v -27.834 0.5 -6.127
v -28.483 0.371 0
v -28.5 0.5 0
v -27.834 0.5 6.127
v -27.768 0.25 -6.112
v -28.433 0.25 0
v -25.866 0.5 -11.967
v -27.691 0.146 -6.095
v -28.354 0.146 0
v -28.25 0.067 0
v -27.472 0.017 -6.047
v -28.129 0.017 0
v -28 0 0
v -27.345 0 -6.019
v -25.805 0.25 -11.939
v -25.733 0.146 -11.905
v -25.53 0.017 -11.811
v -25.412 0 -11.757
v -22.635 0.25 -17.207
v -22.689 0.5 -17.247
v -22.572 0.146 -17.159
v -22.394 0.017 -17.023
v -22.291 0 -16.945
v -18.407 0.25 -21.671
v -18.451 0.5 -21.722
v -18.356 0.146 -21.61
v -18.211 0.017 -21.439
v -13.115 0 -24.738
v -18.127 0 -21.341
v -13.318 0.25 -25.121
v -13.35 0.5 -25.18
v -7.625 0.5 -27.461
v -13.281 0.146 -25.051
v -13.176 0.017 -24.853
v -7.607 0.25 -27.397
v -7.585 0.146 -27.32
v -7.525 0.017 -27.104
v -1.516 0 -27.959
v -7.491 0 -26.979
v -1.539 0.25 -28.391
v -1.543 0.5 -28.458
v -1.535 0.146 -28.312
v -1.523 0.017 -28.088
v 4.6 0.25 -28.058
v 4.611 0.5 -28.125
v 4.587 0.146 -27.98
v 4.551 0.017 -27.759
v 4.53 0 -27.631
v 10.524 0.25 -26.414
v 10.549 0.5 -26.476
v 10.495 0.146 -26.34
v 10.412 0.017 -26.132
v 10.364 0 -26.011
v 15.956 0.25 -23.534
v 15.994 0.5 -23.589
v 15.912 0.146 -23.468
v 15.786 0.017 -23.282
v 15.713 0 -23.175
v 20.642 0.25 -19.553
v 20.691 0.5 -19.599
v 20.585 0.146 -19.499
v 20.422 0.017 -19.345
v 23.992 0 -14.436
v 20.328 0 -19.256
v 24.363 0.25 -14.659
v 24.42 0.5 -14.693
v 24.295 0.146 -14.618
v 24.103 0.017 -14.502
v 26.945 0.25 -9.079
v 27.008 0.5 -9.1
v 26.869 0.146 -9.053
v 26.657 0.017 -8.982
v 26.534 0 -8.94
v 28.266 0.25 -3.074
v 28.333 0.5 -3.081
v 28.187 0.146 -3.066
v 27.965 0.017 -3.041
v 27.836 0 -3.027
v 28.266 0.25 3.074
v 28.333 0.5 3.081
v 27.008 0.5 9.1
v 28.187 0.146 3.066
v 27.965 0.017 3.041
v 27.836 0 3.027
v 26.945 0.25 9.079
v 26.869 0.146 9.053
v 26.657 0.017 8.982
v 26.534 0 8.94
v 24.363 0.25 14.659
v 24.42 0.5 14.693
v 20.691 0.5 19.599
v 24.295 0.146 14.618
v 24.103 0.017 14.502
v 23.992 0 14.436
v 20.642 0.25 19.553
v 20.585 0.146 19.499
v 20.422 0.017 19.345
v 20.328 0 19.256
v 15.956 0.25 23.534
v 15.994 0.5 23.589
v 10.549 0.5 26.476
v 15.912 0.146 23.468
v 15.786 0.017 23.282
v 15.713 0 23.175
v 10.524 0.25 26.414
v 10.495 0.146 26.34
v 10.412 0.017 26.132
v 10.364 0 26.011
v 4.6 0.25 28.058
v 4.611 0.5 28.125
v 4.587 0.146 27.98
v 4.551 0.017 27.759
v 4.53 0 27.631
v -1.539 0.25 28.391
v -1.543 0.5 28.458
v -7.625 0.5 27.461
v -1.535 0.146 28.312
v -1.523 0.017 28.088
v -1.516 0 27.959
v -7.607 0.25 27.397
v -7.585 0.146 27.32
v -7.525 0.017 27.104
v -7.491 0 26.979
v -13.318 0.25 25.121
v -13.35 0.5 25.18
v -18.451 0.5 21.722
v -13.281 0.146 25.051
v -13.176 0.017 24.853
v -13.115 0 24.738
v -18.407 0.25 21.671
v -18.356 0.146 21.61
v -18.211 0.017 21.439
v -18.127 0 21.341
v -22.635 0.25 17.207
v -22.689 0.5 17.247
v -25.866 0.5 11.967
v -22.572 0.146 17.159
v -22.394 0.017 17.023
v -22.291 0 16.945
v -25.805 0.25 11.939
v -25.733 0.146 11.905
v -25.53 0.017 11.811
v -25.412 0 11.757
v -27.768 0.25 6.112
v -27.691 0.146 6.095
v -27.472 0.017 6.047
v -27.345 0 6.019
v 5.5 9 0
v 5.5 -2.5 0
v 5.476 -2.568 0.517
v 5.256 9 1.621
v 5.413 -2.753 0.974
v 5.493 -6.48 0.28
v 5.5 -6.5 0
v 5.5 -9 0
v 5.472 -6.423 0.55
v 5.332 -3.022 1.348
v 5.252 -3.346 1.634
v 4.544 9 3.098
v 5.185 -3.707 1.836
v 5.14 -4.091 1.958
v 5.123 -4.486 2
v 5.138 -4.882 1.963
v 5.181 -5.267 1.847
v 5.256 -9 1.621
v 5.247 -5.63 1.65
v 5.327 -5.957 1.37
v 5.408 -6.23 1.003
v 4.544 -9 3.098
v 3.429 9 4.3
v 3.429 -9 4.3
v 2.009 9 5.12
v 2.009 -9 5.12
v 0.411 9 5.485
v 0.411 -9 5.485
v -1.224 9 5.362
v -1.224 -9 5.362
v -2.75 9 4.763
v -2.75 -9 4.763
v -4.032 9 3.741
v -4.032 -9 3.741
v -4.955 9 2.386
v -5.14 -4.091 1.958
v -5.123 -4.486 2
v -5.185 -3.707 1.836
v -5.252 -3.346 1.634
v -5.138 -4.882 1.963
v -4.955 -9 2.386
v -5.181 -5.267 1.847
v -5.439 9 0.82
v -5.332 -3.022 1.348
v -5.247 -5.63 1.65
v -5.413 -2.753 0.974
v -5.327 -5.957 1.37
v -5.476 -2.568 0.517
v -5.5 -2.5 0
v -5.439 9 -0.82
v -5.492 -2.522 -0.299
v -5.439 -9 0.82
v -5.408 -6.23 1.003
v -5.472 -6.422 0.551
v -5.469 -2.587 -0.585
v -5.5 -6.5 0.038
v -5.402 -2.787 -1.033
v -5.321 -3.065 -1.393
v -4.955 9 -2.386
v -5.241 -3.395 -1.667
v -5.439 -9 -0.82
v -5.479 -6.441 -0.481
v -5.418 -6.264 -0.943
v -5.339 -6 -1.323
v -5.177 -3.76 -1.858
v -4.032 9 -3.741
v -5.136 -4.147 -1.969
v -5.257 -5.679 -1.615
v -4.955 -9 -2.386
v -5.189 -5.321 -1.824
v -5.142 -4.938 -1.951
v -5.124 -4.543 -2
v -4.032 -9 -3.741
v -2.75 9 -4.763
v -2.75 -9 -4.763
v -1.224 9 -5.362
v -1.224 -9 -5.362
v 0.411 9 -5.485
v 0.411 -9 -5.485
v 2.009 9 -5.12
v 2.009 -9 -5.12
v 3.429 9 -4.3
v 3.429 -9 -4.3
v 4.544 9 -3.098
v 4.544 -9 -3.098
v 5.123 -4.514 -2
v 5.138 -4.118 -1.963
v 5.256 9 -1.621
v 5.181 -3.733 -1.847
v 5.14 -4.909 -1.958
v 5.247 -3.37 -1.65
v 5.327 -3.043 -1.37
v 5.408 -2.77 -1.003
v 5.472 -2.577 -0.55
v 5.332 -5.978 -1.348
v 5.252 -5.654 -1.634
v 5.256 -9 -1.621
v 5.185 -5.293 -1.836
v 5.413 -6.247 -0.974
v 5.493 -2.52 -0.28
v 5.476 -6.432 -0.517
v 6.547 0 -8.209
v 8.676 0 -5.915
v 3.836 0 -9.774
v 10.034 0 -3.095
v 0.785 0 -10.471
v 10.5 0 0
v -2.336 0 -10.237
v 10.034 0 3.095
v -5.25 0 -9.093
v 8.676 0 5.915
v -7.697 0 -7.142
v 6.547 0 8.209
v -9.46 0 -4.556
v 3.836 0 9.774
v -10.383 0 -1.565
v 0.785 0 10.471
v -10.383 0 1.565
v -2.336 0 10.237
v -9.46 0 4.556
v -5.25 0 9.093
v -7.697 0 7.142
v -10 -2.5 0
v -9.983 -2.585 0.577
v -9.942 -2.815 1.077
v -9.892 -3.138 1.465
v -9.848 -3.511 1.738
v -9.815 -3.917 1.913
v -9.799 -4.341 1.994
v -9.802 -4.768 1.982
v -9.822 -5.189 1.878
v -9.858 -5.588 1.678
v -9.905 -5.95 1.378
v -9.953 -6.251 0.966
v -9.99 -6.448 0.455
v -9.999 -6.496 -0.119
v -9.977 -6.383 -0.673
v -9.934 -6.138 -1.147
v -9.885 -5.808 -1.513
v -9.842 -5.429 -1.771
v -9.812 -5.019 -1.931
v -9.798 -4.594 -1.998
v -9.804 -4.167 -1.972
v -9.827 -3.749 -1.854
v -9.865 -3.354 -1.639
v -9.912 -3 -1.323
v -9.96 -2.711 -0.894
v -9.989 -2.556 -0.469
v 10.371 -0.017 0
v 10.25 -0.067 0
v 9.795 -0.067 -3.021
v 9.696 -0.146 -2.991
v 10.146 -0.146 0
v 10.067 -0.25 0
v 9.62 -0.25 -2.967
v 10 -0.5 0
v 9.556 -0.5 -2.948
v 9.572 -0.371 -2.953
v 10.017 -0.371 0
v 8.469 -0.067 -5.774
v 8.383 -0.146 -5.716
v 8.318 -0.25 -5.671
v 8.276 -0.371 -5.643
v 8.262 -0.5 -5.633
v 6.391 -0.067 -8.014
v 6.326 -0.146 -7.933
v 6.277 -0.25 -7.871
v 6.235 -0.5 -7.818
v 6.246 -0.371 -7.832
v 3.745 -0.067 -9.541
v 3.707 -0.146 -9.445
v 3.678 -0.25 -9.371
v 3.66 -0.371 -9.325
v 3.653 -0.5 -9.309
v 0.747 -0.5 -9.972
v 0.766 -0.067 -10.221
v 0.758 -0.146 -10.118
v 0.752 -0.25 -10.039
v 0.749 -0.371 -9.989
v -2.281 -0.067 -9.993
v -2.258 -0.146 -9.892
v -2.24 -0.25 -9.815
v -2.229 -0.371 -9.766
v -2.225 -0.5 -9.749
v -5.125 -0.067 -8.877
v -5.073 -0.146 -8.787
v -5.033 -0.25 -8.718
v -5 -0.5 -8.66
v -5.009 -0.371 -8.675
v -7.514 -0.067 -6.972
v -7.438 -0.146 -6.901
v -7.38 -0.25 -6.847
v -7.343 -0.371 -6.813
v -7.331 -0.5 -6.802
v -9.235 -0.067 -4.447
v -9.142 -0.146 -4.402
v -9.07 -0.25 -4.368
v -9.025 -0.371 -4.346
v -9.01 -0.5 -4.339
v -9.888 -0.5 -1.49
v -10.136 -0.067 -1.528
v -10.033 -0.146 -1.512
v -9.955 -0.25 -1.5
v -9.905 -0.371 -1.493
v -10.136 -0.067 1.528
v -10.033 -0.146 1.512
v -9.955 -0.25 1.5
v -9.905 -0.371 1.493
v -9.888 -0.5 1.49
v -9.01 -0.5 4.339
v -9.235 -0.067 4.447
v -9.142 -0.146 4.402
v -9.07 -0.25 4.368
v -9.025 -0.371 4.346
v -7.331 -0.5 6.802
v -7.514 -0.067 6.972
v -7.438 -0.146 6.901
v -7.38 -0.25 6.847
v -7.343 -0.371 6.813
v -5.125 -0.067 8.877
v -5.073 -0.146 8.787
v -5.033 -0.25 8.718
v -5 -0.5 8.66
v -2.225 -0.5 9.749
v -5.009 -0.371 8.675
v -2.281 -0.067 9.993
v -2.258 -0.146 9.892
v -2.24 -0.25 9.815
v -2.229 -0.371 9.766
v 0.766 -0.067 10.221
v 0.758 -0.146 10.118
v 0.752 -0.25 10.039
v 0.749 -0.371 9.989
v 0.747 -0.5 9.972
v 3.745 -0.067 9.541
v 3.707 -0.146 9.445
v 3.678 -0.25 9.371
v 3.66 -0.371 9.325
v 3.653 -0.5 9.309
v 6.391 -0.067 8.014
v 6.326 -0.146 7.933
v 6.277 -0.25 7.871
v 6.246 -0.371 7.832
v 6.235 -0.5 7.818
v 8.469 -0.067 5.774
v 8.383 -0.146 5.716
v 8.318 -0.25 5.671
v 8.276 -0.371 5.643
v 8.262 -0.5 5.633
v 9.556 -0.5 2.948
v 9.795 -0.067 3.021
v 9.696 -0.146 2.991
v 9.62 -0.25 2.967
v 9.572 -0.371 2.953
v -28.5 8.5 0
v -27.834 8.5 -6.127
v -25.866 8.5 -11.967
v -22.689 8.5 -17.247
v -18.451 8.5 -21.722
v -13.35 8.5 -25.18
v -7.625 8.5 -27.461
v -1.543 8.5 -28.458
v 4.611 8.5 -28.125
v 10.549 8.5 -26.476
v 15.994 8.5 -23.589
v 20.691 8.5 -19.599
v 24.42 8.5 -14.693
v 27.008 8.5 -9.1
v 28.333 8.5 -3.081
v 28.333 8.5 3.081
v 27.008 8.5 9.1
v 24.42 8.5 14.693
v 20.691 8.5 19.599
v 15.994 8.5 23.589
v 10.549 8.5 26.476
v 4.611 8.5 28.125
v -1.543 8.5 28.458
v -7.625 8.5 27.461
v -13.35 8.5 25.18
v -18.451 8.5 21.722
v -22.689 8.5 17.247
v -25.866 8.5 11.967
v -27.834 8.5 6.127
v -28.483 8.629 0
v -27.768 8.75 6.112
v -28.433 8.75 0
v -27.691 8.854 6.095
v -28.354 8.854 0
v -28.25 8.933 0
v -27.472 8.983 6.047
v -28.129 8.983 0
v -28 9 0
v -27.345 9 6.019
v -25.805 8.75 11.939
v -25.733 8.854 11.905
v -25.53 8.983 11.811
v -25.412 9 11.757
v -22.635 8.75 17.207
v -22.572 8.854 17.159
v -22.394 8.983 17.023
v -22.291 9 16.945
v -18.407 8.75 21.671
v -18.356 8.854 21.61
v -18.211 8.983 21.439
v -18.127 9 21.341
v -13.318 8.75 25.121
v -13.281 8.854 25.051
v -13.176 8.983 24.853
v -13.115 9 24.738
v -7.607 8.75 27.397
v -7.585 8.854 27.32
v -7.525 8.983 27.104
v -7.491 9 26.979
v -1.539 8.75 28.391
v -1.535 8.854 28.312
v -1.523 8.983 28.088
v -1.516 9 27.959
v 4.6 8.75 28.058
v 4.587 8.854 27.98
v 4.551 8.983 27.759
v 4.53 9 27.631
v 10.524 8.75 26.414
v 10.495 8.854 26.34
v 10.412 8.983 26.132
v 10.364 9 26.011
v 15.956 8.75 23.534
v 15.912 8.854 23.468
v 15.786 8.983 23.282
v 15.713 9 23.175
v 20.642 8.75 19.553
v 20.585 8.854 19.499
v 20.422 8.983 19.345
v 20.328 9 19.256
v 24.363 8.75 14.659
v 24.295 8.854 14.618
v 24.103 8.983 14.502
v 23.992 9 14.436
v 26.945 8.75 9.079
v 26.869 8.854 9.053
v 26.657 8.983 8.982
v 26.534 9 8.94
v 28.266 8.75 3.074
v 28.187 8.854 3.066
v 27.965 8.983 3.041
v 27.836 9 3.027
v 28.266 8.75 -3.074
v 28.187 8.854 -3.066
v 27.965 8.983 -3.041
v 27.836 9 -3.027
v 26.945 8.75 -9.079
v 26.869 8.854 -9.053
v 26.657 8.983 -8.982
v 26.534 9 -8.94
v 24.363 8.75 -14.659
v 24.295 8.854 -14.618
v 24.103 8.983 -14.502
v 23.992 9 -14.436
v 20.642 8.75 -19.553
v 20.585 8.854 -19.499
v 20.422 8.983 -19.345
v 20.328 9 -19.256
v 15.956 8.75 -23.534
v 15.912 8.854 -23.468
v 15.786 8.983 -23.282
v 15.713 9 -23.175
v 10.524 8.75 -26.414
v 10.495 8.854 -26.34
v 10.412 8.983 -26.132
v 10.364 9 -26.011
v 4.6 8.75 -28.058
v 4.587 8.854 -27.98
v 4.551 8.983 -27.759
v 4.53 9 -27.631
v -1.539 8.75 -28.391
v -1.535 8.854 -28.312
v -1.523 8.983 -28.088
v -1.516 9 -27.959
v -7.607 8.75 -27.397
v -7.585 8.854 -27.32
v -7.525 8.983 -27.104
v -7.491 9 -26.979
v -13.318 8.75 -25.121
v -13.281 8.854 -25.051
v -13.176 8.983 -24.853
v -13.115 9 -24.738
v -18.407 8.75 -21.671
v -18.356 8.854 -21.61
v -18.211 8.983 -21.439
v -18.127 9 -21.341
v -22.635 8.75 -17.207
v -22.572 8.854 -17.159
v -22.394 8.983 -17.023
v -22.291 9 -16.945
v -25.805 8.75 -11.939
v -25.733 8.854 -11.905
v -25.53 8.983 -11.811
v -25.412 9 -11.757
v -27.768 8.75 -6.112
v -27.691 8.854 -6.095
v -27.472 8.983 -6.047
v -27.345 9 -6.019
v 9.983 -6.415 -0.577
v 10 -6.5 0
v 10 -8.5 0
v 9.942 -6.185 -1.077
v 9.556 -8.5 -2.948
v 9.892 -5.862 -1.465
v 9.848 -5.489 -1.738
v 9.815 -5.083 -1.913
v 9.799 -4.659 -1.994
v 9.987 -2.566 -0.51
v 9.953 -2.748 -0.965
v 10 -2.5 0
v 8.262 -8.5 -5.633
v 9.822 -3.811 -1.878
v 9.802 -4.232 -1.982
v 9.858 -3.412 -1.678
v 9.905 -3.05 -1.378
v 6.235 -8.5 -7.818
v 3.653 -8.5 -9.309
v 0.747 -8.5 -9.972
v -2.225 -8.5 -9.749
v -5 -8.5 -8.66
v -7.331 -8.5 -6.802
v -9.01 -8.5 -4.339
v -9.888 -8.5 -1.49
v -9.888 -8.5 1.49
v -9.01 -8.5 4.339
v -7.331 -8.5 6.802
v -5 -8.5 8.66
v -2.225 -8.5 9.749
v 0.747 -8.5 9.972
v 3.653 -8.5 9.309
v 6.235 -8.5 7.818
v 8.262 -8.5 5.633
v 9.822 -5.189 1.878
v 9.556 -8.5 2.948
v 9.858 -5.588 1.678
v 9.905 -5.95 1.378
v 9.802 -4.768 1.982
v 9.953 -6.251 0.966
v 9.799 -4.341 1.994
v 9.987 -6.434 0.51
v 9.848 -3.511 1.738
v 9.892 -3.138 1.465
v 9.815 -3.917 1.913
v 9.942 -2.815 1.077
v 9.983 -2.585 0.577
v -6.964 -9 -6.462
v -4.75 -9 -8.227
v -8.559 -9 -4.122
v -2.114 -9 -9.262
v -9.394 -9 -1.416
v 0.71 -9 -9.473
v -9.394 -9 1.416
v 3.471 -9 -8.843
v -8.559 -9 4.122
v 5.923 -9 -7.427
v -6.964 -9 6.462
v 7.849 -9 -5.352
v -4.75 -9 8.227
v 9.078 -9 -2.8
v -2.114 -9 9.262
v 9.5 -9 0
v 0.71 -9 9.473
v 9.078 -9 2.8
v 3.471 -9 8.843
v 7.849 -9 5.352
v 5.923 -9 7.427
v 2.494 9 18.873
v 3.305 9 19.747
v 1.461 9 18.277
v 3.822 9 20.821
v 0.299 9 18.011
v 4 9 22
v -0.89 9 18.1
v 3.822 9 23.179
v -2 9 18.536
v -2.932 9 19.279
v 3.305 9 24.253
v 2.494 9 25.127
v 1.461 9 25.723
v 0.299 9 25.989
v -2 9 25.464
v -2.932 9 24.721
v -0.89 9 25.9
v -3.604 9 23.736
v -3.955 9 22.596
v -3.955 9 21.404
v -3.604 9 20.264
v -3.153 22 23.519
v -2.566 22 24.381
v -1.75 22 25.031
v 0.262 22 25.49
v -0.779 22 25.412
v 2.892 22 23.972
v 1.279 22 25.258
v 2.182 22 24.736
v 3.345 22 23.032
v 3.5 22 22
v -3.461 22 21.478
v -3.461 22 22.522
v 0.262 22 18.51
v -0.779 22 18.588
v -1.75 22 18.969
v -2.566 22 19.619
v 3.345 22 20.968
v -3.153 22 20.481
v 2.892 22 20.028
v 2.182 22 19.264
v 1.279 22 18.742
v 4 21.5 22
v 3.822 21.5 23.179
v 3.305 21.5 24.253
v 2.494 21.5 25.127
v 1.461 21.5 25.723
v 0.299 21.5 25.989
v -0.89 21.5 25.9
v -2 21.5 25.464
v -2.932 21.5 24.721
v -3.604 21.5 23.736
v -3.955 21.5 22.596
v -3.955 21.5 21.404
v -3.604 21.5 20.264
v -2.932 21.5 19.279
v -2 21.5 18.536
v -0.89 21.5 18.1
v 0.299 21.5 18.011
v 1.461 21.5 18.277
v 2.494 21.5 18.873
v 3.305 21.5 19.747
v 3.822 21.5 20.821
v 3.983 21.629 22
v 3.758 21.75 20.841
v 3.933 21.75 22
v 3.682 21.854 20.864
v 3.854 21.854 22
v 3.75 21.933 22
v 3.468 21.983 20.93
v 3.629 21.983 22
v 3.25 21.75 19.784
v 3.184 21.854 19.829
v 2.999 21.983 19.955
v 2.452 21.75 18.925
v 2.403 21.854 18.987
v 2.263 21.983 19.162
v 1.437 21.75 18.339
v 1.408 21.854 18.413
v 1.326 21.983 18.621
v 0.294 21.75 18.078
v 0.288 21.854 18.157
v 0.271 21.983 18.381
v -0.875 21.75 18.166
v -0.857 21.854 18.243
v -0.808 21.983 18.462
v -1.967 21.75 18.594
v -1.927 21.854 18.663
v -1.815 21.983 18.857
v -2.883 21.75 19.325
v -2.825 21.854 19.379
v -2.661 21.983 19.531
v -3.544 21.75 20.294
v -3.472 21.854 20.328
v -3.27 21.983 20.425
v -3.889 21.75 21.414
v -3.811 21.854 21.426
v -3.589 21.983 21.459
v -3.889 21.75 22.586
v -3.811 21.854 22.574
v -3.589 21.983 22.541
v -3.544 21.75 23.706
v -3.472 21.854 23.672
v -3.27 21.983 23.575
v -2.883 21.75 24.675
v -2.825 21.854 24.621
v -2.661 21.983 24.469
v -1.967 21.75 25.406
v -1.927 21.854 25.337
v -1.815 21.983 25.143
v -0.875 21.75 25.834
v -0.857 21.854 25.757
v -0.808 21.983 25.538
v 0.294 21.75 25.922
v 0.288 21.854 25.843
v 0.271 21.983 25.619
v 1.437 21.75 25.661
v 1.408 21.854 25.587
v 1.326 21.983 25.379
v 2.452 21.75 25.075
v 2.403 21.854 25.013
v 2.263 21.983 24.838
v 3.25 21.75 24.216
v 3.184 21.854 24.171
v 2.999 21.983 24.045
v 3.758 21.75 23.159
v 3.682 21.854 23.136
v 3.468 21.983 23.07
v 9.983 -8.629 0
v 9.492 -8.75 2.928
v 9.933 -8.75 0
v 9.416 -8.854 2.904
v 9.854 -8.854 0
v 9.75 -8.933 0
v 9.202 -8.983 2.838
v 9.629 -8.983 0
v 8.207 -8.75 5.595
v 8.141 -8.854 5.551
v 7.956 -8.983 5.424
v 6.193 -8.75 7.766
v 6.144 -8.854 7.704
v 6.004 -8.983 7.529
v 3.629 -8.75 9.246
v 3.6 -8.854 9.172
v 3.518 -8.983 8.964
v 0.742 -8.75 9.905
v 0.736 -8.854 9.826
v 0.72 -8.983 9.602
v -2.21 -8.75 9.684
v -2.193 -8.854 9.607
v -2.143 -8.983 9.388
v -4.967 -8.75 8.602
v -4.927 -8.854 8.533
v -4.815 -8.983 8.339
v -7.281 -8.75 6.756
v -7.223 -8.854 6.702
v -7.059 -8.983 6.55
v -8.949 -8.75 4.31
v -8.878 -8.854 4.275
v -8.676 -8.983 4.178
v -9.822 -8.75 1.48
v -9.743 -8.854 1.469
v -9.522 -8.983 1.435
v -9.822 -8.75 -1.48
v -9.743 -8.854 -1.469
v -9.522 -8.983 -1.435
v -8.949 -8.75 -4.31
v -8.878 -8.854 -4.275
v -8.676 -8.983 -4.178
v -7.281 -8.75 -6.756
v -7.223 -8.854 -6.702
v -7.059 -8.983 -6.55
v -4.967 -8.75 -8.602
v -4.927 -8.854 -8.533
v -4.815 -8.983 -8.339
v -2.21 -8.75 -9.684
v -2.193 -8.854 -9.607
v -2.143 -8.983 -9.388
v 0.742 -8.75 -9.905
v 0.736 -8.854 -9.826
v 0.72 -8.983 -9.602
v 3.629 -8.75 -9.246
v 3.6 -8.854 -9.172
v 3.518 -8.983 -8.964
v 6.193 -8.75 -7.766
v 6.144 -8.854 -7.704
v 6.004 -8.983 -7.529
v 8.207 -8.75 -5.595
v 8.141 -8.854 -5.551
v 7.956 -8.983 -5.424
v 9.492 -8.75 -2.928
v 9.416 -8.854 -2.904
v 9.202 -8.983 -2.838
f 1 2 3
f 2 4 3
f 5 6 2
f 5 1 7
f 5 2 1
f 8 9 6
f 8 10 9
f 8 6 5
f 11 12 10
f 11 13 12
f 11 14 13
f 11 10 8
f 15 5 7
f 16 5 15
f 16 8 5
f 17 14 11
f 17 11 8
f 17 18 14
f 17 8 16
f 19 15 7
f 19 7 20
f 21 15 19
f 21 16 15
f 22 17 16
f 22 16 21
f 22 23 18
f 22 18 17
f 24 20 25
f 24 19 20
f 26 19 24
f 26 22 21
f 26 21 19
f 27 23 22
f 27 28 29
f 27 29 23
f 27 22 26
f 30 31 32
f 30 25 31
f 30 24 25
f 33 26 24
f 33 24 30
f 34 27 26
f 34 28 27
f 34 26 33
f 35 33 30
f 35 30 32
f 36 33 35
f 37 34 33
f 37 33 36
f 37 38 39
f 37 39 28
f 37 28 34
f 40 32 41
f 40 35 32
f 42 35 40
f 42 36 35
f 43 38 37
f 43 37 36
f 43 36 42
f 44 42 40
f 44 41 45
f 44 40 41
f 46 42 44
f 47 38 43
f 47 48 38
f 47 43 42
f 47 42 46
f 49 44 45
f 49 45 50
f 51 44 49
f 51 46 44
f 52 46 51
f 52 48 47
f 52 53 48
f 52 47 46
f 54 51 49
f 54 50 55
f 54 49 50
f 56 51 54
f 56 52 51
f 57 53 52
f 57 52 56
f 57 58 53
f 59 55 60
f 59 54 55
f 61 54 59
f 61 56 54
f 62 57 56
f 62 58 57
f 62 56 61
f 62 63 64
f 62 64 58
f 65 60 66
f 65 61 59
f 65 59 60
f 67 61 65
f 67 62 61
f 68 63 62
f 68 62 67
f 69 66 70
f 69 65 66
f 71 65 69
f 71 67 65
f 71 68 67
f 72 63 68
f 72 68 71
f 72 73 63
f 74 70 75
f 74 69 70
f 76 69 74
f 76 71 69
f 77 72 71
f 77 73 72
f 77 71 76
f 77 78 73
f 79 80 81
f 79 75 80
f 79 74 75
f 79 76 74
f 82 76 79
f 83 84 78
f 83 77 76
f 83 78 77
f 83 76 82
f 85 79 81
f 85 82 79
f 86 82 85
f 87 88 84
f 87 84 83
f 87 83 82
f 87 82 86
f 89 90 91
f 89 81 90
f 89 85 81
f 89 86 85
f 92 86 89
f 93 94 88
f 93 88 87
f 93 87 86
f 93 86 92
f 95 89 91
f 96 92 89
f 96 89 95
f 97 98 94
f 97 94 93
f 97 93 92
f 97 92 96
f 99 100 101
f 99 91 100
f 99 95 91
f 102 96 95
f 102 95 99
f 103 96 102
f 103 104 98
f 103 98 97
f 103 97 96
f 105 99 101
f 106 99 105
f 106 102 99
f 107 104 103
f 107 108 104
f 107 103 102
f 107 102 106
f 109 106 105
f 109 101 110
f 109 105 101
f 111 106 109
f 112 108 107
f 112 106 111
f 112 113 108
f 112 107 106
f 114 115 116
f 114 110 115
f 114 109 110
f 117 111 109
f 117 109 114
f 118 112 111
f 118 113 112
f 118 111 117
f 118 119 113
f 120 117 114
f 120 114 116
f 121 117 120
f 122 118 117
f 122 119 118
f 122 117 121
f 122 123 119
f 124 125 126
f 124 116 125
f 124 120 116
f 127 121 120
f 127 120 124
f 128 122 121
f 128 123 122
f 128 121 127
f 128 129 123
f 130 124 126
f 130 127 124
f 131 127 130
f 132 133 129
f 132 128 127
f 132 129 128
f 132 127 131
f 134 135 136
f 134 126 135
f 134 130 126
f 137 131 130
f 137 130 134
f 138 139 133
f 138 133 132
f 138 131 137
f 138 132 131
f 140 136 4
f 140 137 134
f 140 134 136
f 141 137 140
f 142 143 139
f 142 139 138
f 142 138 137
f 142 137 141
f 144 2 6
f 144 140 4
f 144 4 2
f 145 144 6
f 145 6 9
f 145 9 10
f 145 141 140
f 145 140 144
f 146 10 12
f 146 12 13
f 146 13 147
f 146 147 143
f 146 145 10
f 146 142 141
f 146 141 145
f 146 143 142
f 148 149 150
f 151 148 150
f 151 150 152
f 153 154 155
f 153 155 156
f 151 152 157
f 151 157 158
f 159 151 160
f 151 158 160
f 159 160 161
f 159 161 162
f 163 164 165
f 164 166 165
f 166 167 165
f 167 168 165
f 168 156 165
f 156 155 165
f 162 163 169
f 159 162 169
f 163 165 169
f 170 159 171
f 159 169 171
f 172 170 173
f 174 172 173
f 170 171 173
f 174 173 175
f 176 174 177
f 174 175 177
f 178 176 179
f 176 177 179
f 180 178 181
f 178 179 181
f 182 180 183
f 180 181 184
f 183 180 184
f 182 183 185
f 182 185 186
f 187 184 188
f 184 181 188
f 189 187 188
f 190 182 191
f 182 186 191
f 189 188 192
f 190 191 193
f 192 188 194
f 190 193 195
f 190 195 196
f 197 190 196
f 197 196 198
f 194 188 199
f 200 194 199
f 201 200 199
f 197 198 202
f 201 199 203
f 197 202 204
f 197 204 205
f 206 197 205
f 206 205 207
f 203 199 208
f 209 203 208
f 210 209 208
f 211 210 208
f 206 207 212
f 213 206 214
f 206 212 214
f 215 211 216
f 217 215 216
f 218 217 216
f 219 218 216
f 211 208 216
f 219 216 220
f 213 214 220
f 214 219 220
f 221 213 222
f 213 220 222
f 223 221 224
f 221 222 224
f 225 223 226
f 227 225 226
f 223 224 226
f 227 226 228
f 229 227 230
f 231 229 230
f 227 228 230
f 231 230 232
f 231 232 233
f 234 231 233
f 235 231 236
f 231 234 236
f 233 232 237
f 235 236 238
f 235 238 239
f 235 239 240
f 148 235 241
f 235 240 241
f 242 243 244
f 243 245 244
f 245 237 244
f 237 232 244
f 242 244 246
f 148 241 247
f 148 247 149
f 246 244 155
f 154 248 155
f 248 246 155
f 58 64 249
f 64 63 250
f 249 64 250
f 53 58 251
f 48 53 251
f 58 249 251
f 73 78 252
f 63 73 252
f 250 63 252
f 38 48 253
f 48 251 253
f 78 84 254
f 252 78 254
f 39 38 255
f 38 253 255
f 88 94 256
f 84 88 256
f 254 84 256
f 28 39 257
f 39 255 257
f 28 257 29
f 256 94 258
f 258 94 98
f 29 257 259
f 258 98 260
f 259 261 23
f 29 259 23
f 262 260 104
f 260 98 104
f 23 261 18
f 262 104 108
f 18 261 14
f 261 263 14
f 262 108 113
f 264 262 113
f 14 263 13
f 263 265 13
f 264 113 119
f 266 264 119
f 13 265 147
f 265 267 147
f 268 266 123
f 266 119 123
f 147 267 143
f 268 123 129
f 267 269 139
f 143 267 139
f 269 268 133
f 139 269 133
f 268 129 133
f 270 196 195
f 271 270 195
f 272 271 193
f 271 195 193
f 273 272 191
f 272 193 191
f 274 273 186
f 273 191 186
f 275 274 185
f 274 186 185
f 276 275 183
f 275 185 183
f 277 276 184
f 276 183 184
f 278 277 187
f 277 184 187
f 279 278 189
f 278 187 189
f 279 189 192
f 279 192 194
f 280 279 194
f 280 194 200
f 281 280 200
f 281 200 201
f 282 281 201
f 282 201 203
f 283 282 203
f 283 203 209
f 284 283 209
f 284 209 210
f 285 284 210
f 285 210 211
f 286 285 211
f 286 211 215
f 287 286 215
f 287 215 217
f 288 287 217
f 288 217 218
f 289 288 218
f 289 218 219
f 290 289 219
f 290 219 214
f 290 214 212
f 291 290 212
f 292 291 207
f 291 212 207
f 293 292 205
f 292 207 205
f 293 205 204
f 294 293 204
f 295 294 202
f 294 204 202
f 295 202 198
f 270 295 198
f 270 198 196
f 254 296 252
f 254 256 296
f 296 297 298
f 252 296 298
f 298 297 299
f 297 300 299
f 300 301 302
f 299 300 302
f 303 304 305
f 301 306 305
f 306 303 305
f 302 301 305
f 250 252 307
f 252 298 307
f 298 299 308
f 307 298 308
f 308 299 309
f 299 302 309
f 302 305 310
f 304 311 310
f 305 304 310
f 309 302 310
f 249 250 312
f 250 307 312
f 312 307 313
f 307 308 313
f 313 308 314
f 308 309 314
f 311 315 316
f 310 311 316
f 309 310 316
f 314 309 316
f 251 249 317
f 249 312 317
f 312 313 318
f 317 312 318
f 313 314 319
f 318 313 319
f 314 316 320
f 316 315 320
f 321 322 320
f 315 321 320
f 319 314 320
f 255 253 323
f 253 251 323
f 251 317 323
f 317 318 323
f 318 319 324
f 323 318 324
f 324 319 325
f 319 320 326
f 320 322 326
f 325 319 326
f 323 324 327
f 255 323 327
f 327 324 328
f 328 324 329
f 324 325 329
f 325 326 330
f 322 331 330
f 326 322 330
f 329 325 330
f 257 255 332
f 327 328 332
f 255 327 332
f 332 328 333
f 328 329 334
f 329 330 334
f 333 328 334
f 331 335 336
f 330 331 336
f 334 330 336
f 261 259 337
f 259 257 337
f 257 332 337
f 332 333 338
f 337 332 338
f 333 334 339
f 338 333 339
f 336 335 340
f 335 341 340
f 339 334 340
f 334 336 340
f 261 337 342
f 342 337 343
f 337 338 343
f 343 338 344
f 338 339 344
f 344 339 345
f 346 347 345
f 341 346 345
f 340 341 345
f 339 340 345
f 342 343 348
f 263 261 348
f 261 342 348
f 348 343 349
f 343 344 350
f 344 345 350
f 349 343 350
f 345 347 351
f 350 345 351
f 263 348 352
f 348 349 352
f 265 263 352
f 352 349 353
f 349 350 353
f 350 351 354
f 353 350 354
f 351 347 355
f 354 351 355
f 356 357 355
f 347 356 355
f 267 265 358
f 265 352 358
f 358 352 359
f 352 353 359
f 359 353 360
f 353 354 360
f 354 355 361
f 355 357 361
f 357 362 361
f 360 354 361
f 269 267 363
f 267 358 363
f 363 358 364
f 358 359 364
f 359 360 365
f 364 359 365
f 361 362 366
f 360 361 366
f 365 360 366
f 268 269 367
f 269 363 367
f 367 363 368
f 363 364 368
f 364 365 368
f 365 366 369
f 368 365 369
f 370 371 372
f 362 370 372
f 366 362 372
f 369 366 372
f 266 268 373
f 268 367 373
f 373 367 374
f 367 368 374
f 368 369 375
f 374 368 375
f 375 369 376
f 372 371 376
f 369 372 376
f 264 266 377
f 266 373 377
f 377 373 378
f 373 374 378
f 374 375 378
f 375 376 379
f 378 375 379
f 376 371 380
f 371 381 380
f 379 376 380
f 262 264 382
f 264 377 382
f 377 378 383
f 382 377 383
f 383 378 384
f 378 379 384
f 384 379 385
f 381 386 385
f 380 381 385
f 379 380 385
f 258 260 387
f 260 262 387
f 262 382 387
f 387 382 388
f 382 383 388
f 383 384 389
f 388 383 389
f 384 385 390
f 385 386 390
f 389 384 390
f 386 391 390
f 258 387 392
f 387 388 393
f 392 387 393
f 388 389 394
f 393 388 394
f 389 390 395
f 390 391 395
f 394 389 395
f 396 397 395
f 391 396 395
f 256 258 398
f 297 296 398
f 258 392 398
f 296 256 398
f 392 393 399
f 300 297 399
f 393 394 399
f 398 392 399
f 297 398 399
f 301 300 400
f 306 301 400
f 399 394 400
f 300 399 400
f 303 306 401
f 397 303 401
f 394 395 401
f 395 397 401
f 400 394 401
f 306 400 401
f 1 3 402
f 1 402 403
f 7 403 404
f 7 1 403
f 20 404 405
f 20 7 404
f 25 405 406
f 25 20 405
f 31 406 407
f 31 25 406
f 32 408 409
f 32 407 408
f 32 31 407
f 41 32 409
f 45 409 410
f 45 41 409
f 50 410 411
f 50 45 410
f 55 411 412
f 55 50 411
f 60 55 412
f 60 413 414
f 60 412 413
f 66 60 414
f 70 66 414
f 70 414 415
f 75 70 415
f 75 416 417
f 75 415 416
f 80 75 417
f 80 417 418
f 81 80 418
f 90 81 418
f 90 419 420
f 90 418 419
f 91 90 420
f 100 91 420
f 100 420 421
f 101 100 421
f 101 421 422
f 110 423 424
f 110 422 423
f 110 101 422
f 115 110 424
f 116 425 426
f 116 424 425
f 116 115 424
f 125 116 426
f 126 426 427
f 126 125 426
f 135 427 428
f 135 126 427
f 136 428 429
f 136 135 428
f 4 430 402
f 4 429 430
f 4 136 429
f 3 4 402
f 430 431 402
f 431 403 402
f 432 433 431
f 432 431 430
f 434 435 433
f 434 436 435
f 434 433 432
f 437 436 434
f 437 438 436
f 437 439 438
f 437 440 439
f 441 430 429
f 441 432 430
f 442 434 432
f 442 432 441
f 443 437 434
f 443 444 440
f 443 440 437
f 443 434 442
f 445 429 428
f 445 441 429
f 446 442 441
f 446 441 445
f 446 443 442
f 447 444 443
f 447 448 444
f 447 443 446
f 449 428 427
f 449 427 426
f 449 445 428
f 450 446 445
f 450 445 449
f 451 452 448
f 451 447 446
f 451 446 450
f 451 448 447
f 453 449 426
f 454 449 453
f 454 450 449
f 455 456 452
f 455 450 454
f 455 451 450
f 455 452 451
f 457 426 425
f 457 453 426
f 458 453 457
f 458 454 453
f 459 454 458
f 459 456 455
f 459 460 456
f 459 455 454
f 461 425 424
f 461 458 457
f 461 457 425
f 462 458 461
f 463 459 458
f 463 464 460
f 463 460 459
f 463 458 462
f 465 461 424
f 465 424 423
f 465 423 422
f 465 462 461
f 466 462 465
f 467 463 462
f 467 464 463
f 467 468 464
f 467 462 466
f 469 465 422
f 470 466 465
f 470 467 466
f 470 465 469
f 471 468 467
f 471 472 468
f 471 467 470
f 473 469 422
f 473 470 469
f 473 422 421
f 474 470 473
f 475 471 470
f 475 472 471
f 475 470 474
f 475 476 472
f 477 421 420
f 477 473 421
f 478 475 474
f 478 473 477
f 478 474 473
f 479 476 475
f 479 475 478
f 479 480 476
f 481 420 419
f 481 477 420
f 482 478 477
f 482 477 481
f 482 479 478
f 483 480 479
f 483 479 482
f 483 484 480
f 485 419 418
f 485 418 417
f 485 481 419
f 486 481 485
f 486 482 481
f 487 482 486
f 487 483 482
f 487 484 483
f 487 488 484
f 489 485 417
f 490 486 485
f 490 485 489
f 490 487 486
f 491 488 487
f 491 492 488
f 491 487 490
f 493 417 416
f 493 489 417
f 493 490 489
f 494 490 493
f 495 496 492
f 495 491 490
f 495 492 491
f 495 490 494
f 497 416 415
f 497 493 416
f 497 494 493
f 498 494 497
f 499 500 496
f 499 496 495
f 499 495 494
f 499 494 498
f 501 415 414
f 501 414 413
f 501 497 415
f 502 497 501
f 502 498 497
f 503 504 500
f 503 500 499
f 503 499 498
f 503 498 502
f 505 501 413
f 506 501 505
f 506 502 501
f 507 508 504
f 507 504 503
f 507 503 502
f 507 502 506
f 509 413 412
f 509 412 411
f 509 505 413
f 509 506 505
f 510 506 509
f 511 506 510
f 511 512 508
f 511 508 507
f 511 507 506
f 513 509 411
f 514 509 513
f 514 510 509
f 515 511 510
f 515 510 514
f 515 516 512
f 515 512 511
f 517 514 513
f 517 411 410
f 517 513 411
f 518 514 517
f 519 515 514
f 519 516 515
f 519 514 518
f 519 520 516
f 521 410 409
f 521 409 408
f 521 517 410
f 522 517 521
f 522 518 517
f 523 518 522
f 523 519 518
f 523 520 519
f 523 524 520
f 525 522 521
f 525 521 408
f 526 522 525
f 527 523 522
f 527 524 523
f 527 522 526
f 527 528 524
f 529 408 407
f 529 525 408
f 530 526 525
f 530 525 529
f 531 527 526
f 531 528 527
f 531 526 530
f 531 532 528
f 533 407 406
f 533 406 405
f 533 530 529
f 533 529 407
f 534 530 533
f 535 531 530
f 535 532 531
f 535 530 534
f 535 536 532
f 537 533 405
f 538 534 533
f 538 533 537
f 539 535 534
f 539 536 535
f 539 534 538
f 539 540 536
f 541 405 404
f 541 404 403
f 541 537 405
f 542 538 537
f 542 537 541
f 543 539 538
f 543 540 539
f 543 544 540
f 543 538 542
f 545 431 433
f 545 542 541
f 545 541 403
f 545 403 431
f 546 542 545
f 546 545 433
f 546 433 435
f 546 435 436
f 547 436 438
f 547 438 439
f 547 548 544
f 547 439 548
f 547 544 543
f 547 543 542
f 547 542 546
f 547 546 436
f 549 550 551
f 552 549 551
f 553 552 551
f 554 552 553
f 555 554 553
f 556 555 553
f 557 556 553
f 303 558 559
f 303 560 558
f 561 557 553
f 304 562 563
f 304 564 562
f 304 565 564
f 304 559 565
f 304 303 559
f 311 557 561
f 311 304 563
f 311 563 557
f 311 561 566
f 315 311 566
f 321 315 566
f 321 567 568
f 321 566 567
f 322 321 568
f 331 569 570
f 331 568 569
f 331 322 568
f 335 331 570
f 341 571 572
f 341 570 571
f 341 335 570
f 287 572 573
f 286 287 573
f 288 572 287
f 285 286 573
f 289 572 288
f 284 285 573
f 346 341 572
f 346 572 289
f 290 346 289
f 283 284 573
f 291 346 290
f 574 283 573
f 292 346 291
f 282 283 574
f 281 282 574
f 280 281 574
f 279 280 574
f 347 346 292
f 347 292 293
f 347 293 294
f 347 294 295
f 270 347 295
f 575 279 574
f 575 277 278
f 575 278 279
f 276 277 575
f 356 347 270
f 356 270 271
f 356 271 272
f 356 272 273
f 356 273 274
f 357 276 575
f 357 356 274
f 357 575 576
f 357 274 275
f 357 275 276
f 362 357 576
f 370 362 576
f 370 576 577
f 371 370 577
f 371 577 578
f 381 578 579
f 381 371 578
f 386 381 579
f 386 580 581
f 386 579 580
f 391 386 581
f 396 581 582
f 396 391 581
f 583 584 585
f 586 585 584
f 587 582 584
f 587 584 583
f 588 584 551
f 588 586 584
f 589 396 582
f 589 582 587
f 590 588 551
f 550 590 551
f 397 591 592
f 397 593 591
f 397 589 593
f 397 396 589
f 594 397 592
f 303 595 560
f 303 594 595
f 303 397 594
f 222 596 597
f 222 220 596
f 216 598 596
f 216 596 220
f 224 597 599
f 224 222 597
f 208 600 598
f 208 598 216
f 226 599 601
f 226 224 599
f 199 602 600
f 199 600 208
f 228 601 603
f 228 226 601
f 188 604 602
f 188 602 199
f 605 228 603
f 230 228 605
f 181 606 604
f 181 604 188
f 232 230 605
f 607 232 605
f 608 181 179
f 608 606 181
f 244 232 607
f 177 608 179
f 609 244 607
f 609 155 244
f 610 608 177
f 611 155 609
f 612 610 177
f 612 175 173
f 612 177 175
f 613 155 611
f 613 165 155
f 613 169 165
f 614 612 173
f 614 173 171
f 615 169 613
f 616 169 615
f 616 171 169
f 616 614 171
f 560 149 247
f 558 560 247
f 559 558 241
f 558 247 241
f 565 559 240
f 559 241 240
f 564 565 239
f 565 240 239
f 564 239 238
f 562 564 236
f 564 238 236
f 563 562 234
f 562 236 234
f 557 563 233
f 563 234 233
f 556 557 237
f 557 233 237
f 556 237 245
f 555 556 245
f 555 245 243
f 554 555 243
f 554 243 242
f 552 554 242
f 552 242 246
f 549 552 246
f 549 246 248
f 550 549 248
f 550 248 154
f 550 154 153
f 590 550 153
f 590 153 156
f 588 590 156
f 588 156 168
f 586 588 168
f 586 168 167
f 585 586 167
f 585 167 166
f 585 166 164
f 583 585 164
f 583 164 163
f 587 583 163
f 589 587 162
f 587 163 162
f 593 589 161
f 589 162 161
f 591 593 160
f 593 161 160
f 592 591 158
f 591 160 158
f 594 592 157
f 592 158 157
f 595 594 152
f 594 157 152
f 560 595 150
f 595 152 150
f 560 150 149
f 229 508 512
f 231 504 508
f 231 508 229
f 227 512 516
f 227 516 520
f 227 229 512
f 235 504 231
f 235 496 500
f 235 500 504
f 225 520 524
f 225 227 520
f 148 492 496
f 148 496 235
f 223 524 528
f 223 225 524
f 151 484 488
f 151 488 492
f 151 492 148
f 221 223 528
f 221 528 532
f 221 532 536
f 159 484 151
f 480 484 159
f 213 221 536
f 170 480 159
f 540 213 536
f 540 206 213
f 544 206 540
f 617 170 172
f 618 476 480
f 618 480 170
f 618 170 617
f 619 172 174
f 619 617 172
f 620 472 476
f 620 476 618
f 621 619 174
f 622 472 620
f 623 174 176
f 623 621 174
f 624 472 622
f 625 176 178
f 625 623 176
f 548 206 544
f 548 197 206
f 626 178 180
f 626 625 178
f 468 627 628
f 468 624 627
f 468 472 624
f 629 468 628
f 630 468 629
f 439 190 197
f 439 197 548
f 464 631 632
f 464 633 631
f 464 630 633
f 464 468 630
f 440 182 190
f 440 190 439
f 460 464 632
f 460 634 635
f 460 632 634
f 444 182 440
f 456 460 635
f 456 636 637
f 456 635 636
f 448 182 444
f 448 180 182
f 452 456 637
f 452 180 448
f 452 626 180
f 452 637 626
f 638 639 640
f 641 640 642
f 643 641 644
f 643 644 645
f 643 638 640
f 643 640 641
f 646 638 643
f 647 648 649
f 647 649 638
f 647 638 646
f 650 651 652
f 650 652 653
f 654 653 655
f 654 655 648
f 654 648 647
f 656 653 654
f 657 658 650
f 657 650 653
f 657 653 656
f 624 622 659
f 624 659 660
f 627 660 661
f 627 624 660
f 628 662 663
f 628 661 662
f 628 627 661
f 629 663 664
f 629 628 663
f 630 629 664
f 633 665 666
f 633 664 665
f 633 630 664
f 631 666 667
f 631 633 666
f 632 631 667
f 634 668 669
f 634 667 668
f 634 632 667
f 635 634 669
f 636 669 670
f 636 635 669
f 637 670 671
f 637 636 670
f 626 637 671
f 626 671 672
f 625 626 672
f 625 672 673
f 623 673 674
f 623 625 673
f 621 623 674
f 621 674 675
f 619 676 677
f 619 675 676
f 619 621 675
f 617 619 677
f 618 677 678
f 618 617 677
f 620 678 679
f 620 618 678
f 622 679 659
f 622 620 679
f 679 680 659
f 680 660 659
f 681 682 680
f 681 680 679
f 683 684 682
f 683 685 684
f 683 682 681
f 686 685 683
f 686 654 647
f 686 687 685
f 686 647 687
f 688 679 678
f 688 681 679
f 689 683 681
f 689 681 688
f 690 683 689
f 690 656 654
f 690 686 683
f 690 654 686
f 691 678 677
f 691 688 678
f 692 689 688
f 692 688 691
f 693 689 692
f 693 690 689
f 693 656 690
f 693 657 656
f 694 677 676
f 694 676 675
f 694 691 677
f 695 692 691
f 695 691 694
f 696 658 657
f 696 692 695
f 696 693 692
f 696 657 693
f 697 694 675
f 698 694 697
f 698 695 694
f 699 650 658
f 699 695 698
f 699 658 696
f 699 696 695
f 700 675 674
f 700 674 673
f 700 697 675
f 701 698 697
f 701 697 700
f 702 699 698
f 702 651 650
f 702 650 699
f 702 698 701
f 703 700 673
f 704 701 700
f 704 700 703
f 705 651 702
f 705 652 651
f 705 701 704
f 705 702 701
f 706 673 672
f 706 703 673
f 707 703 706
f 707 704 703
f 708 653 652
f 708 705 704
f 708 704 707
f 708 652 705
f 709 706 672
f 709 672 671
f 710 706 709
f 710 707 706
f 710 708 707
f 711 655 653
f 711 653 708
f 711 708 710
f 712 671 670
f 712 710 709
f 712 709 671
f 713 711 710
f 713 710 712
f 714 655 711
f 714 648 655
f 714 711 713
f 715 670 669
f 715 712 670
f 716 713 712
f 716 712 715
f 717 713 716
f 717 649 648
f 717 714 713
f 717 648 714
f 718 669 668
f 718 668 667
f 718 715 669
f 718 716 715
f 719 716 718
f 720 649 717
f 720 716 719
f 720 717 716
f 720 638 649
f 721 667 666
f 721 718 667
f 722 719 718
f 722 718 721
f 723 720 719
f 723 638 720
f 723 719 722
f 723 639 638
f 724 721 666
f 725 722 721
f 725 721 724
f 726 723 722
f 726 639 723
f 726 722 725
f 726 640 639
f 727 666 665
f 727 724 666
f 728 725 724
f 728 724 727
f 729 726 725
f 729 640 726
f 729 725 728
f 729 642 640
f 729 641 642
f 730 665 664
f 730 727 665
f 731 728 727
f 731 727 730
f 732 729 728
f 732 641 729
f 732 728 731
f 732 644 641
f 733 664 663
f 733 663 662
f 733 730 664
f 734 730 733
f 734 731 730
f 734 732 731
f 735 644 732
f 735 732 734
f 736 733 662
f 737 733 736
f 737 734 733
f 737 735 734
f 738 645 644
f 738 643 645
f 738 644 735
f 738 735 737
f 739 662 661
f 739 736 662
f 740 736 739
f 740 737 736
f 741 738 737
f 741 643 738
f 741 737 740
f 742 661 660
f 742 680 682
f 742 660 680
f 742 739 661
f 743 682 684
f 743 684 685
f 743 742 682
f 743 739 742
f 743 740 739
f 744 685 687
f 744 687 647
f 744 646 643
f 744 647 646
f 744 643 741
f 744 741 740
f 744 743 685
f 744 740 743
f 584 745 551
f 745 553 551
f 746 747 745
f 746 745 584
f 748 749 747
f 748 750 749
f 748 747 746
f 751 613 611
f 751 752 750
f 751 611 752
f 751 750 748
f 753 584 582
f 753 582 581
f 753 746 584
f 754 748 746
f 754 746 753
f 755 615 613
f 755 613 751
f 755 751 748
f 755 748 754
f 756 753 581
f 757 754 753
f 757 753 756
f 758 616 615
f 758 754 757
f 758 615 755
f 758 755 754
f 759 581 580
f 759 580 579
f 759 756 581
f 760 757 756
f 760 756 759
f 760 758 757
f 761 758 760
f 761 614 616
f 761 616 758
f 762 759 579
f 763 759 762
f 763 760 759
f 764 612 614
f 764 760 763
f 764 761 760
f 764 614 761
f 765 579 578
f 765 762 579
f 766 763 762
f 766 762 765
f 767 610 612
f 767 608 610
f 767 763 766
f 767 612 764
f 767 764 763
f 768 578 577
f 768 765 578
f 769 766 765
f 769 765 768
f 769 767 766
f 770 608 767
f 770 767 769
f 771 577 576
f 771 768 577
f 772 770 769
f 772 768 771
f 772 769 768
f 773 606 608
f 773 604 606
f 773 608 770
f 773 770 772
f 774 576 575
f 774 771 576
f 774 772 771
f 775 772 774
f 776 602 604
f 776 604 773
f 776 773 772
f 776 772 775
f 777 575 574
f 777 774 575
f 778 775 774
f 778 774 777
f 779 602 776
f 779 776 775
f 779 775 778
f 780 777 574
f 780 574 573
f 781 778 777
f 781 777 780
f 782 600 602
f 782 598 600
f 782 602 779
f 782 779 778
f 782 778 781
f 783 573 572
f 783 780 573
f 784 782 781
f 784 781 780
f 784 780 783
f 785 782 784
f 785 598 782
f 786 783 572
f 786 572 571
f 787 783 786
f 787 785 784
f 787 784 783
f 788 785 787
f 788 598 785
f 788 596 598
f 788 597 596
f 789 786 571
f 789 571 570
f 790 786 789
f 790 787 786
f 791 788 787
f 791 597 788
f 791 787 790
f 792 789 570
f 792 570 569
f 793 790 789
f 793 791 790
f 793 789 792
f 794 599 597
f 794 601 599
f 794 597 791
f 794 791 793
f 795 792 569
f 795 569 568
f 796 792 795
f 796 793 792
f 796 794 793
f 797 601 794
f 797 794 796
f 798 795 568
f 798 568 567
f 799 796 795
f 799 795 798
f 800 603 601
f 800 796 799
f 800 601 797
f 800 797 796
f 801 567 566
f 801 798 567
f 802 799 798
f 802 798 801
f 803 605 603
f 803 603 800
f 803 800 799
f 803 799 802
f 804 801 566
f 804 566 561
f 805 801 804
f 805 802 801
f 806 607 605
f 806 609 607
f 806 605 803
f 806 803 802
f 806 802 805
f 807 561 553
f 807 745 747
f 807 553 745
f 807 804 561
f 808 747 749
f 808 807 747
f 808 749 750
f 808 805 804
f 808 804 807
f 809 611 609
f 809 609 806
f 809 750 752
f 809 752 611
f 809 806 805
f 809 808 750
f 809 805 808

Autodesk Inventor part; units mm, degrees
ref_plane "XZ Plane" through (0, 0, 0) normal (0, 1, 0) x (-1, 0, 0)
ref_plane "XY Plane" through (0, 0, 0) normal (0, 0, 1) x (1, 0, 0)
sketch "Skizze1" plane through (0, 0, 0) normal (0, 1, 0) x (-1, 0, 0)
  circle A0 centre (0, 0) radius 28.5
  dimension "d0" = 57
extrude "Extrusion1" add sketch "Skizze1" along normal blind 9
sketch "Skizze2" plane through (0, 0, 0) normal (0, -1, 0) x (1, 0, 0)
  circle A0 centre (0, 0) radius 10
  dimension "d3" = 20
extrude "Extrusion2" add sketch "Skizze2" along normal blind 9
sketch "Skizze3" plane through (0, 9, 0) normal (0, 1, 0) x (1, 0, 0)
  circle A0 centre (0, -22) radius 4
  point P0 (0, 0)
  dimension "d6" = 8
extrude "Extrusion3" add sketch "Skizze3" along normal blind 13
sketch "Skizze4" plane through (0, 0, 0) normal (1, 0, 0) x (0, 1, 0)
  circle A0 centre (-4.5, 0) radius 2
  point P0 (0, 0)
  dimension "d9" = 4
extrude "Extrusion4" cut sketch "Skizze4" along normal mid plane 25
sketch "Skizze5" plane through (0, -9, 0) normal (0, -1, 0) x (1, 0, 0)
  circle A0 centre (0, 0) radius 5.5
  dimension "d12" = 11
extrude "Extrusion5" cut sketch "Skizze5" against normal up to surface (18 mm away)
fillet "Rundung1" radius 0.5 5 edges at (28.5, 9, 0) (28.5, 0, 0) (-10, 0, 0) (-10, -9, 0) (-4, 22, 22)
properties part number "sf_Crank_Disc_1"
